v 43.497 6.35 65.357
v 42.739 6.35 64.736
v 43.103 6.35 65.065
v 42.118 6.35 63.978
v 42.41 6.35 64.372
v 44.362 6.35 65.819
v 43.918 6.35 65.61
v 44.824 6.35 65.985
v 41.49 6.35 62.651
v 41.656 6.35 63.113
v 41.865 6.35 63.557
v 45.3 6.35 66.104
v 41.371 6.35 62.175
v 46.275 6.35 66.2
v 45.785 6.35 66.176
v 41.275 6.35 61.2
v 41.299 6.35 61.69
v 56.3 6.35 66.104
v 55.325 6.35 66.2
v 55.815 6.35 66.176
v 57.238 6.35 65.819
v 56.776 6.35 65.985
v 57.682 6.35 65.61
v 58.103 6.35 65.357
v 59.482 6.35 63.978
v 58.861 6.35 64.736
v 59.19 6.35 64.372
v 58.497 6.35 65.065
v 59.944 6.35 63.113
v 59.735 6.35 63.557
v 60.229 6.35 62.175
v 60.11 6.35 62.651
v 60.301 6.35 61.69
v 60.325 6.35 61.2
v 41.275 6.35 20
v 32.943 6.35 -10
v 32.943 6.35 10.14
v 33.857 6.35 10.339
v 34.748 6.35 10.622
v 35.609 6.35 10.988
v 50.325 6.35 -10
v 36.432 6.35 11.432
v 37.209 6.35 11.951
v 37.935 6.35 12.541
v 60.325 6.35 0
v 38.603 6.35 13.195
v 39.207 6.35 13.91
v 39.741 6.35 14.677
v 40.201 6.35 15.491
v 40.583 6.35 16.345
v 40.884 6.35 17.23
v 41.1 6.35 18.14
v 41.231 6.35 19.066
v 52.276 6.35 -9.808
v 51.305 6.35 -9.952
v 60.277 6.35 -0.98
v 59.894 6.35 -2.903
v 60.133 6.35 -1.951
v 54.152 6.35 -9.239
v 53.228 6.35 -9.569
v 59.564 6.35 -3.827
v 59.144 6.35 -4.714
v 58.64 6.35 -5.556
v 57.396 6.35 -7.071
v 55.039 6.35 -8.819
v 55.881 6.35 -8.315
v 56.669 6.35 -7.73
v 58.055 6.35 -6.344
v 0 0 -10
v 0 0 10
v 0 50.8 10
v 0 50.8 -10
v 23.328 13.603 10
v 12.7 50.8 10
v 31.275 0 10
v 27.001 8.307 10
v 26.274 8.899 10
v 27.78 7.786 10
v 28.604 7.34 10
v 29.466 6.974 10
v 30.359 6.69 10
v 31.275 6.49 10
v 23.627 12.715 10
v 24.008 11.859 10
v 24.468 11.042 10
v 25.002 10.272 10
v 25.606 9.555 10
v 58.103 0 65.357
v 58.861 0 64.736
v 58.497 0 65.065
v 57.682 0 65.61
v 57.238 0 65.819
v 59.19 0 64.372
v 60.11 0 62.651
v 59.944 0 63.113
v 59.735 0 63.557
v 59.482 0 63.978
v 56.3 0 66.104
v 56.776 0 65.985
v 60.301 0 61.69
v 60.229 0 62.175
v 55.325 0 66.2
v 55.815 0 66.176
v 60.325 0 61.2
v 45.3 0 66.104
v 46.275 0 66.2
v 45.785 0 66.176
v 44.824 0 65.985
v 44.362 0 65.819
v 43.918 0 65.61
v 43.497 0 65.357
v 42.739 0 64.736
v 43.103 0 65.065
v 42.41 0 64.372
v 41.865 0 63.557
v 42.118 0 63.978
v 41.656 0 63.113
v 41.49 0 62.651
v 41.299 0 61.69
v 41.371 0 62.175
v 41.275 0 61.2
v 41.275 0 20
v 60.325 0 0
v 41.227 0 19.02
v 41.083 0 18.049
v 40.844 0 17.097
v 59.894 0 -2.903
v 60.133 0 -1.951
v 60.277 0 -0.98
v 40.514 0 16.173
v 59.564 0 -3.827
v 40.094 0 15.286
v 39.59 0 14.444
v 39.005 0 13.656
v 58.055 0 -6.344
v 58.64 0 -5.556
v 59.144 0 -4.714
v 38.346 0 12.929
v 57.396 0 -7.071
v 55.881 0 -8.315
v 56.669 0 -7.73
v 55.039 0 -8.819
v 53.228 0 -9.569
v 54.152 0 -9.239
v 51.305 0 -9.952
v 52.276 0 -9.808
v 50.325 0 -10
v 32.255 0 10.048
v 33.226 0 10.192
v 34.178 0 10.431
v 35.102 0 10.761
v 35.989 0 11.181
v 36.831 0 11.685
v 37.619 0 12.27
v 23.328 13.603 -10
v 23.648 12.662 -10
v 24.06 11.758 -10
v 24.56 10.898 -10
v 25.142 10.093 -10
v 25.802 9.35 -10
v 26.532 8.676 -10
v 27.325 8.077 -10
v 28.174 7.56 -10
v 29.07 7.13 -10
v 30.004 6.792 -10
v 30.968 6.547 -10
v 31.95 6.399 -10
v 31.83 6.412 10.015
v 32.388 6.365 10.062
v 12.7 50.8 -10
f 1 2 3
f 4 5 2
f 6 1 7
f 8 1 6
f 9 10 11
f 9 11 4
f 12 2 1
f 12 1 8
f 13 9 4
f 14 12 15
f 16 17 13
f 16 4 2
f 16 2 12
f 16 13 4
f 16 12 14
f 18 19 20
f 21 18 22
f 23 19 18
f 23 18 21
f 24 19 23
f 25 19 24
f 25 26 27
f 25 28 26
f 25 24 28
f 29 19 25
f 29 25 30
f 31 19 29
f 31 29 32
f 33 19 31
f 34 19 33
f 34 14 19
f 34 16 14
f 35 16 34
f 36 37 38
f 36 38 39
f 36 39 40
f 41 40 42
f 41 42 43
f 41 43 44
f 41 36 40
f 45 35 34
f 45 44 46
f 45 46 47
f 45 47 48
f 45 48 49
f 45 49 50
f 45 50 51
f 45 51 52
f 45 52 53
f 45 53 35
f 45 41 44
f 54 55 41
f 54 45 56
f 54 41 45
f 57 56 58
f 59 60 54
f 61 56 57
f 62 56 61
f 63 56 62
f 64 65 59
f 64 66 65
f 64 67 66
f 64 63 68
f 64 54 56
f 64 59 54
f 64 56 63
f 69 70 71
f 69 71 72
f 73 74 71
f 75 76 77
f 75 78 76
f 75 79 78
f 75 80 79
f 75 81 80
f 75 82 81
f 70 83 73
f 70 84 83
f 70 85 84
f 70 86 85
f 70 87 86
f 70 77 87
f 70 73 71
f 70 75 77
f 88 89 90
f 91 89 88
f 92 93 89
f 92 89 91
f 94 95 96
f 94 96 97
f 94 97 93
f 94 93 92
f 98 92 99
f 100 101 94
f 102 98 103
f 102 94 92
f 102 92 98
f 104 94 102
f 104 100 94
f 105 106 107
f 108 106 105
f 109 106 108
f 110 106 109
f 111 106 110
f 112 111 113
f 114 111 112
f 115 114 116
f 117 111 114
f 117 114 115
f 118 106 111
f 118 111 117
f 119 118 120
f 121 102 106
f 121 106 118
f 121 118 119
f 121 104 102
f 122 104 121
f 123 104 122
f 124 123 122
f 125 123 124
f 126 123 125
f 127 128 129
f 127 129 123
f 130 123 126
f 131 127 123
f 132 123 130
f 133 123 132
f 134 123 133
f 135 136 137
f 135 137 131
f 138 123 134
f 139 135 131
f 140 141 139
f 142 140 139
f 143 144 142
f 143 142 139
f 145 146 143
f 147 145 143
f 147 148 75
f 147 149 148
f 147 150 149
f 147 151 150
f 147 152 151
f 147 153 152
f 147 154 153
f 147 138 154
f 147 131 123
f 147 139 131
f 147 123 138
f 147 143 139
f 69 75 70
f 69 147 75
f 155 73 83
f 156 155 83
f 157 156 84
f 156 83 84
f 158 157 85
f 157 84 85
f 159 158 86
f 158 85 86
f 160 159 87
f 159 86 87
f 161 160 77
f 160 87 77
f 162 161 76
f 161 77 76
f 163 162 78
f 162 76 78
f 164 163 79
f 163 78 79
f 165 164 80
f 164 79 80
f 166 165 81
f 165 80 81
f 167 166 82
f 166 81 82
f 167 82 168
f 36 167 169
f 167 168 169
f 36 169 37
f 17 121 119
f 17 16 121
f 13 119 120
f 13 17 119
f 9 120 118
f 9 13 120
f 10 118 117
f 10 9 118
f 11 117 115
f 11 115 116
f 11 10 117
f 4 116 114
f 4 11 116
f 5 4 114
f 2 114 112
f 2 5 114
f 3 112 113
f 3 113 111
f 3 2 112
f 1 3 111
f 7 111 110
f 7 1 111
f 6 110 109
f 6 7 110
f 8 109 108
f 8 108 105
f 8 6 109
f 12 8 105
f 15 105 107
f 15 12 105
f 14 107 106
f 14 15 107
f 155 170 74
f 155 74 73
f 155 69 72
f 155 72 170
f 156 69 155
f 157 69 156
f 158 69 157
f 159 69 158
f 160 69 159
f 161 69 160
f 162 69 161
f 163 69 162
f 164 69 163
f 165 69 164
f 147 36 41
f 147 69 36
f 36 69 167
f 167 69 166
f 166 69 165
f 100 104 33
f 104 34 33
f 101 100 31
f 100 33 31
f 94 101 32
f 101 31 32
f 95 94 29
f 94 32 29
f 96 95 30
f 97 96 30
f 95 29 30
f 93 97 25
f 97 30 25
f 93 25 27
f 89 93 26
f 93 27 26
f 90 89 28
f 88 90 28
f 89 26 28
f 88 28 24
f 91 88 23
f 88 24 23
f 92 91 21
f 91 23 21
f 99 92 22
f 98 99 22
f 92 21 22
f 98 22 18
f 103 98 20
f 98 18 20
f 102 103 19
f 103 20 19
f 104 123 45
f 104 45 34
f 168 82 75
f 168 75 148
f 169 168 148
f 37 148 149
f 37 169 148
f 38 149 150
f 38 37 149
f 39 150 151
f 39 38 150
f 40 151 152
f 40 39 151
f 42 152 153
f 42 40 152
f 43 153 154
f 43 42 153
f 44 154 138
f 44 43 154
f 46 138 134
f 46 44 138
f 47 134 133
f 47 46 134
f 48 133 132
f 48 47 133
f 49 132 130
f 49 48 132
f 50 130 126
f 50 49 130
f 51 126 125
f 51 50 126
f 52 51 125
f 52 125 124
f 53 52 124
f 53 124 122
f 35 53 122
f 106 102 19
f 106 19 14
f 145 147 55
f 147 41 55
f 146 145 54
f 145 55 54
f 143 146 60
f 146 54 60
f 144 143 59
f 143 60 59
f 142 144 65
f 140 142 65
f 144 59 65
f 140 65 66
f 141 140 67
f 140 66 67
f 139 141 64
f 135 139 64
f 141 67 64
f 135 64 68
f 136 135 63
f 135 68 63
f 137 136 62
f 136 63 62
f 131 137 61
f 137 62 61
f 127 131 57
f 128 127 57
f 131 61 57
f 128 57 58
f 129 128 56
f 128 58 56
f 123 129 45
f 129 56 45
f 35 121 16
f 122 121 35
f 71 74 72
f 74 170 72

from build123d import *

# Parameters (mm, degrees)
BOSS_EXTRUDE2_DEPTH     = 50.8
CUT_EXTRUDE1_DEPTH      = 103.966915196
CUT_EXTRUDE1_DEPTH_BACK = 103.966915196
FILLET1_R               = 10
FILLET2_R               = 10
FILLET3_R               = 5


with BuildPart() as part:
    # Sketch2 → Boss-Extrude2 (new body)
    with BuildSketch(Plane(origin=(0, 0, 0), x_dir=(1, 0, 0), z_dir=(0, 1, 0))):
        Polygon((0, -10), (0, 10), (60.325, 10), (60.325, -66.2), (41.275, -66.2), (41.275, -10), align=None)
    extrude(amount=BOSS_EXTRUDE2_DEPTH)

    # Sketch3 → Cut-Extrude1 (cut, two sides: drawn at the far end of the back side and taken through both)
    with BuildSketch(Plane.XY.offset(-CUT_EXTRUDE1_DEPTH_BACK)):
        Polygon((12.7, 50.8), (25.4, 6.35), (60.325, 6.35), (60.325, 50.8), align=None)
    extrude(amount=CUT_EXTRUDE1_DEPTH + CUT_EXTRUDE1_DEPTH_BACK, mode=Mode.SUBTRACT)

    # Fillet1
    fillet1_edges = [part.edges().sort_by_distance(p)[0] for p in [
        (25.4, 6.35, 0),
    ]]
    fillet(fillet1_edges, radius=FILLET1_R)

    # Fillet2
    fillet2_edges = [part.edges().sort_by_distance(p)[0] for p in [
        (60.325, 3.175, -10),
        (41.275, 3.175, 10),
    ]]
    fillet(fillet2_edges, radius=FILLET2_R)

    # Fillet3
    fillet3_edges = [part.edges().sort_by_distance(p)[0] for p in [
        (60.325, 3.175, 66.2),
        (41.275, 3.175, 66.2),
    ]]
    fillet(fillet3_edges, radius=FILLET3_R)


solid = part.part
